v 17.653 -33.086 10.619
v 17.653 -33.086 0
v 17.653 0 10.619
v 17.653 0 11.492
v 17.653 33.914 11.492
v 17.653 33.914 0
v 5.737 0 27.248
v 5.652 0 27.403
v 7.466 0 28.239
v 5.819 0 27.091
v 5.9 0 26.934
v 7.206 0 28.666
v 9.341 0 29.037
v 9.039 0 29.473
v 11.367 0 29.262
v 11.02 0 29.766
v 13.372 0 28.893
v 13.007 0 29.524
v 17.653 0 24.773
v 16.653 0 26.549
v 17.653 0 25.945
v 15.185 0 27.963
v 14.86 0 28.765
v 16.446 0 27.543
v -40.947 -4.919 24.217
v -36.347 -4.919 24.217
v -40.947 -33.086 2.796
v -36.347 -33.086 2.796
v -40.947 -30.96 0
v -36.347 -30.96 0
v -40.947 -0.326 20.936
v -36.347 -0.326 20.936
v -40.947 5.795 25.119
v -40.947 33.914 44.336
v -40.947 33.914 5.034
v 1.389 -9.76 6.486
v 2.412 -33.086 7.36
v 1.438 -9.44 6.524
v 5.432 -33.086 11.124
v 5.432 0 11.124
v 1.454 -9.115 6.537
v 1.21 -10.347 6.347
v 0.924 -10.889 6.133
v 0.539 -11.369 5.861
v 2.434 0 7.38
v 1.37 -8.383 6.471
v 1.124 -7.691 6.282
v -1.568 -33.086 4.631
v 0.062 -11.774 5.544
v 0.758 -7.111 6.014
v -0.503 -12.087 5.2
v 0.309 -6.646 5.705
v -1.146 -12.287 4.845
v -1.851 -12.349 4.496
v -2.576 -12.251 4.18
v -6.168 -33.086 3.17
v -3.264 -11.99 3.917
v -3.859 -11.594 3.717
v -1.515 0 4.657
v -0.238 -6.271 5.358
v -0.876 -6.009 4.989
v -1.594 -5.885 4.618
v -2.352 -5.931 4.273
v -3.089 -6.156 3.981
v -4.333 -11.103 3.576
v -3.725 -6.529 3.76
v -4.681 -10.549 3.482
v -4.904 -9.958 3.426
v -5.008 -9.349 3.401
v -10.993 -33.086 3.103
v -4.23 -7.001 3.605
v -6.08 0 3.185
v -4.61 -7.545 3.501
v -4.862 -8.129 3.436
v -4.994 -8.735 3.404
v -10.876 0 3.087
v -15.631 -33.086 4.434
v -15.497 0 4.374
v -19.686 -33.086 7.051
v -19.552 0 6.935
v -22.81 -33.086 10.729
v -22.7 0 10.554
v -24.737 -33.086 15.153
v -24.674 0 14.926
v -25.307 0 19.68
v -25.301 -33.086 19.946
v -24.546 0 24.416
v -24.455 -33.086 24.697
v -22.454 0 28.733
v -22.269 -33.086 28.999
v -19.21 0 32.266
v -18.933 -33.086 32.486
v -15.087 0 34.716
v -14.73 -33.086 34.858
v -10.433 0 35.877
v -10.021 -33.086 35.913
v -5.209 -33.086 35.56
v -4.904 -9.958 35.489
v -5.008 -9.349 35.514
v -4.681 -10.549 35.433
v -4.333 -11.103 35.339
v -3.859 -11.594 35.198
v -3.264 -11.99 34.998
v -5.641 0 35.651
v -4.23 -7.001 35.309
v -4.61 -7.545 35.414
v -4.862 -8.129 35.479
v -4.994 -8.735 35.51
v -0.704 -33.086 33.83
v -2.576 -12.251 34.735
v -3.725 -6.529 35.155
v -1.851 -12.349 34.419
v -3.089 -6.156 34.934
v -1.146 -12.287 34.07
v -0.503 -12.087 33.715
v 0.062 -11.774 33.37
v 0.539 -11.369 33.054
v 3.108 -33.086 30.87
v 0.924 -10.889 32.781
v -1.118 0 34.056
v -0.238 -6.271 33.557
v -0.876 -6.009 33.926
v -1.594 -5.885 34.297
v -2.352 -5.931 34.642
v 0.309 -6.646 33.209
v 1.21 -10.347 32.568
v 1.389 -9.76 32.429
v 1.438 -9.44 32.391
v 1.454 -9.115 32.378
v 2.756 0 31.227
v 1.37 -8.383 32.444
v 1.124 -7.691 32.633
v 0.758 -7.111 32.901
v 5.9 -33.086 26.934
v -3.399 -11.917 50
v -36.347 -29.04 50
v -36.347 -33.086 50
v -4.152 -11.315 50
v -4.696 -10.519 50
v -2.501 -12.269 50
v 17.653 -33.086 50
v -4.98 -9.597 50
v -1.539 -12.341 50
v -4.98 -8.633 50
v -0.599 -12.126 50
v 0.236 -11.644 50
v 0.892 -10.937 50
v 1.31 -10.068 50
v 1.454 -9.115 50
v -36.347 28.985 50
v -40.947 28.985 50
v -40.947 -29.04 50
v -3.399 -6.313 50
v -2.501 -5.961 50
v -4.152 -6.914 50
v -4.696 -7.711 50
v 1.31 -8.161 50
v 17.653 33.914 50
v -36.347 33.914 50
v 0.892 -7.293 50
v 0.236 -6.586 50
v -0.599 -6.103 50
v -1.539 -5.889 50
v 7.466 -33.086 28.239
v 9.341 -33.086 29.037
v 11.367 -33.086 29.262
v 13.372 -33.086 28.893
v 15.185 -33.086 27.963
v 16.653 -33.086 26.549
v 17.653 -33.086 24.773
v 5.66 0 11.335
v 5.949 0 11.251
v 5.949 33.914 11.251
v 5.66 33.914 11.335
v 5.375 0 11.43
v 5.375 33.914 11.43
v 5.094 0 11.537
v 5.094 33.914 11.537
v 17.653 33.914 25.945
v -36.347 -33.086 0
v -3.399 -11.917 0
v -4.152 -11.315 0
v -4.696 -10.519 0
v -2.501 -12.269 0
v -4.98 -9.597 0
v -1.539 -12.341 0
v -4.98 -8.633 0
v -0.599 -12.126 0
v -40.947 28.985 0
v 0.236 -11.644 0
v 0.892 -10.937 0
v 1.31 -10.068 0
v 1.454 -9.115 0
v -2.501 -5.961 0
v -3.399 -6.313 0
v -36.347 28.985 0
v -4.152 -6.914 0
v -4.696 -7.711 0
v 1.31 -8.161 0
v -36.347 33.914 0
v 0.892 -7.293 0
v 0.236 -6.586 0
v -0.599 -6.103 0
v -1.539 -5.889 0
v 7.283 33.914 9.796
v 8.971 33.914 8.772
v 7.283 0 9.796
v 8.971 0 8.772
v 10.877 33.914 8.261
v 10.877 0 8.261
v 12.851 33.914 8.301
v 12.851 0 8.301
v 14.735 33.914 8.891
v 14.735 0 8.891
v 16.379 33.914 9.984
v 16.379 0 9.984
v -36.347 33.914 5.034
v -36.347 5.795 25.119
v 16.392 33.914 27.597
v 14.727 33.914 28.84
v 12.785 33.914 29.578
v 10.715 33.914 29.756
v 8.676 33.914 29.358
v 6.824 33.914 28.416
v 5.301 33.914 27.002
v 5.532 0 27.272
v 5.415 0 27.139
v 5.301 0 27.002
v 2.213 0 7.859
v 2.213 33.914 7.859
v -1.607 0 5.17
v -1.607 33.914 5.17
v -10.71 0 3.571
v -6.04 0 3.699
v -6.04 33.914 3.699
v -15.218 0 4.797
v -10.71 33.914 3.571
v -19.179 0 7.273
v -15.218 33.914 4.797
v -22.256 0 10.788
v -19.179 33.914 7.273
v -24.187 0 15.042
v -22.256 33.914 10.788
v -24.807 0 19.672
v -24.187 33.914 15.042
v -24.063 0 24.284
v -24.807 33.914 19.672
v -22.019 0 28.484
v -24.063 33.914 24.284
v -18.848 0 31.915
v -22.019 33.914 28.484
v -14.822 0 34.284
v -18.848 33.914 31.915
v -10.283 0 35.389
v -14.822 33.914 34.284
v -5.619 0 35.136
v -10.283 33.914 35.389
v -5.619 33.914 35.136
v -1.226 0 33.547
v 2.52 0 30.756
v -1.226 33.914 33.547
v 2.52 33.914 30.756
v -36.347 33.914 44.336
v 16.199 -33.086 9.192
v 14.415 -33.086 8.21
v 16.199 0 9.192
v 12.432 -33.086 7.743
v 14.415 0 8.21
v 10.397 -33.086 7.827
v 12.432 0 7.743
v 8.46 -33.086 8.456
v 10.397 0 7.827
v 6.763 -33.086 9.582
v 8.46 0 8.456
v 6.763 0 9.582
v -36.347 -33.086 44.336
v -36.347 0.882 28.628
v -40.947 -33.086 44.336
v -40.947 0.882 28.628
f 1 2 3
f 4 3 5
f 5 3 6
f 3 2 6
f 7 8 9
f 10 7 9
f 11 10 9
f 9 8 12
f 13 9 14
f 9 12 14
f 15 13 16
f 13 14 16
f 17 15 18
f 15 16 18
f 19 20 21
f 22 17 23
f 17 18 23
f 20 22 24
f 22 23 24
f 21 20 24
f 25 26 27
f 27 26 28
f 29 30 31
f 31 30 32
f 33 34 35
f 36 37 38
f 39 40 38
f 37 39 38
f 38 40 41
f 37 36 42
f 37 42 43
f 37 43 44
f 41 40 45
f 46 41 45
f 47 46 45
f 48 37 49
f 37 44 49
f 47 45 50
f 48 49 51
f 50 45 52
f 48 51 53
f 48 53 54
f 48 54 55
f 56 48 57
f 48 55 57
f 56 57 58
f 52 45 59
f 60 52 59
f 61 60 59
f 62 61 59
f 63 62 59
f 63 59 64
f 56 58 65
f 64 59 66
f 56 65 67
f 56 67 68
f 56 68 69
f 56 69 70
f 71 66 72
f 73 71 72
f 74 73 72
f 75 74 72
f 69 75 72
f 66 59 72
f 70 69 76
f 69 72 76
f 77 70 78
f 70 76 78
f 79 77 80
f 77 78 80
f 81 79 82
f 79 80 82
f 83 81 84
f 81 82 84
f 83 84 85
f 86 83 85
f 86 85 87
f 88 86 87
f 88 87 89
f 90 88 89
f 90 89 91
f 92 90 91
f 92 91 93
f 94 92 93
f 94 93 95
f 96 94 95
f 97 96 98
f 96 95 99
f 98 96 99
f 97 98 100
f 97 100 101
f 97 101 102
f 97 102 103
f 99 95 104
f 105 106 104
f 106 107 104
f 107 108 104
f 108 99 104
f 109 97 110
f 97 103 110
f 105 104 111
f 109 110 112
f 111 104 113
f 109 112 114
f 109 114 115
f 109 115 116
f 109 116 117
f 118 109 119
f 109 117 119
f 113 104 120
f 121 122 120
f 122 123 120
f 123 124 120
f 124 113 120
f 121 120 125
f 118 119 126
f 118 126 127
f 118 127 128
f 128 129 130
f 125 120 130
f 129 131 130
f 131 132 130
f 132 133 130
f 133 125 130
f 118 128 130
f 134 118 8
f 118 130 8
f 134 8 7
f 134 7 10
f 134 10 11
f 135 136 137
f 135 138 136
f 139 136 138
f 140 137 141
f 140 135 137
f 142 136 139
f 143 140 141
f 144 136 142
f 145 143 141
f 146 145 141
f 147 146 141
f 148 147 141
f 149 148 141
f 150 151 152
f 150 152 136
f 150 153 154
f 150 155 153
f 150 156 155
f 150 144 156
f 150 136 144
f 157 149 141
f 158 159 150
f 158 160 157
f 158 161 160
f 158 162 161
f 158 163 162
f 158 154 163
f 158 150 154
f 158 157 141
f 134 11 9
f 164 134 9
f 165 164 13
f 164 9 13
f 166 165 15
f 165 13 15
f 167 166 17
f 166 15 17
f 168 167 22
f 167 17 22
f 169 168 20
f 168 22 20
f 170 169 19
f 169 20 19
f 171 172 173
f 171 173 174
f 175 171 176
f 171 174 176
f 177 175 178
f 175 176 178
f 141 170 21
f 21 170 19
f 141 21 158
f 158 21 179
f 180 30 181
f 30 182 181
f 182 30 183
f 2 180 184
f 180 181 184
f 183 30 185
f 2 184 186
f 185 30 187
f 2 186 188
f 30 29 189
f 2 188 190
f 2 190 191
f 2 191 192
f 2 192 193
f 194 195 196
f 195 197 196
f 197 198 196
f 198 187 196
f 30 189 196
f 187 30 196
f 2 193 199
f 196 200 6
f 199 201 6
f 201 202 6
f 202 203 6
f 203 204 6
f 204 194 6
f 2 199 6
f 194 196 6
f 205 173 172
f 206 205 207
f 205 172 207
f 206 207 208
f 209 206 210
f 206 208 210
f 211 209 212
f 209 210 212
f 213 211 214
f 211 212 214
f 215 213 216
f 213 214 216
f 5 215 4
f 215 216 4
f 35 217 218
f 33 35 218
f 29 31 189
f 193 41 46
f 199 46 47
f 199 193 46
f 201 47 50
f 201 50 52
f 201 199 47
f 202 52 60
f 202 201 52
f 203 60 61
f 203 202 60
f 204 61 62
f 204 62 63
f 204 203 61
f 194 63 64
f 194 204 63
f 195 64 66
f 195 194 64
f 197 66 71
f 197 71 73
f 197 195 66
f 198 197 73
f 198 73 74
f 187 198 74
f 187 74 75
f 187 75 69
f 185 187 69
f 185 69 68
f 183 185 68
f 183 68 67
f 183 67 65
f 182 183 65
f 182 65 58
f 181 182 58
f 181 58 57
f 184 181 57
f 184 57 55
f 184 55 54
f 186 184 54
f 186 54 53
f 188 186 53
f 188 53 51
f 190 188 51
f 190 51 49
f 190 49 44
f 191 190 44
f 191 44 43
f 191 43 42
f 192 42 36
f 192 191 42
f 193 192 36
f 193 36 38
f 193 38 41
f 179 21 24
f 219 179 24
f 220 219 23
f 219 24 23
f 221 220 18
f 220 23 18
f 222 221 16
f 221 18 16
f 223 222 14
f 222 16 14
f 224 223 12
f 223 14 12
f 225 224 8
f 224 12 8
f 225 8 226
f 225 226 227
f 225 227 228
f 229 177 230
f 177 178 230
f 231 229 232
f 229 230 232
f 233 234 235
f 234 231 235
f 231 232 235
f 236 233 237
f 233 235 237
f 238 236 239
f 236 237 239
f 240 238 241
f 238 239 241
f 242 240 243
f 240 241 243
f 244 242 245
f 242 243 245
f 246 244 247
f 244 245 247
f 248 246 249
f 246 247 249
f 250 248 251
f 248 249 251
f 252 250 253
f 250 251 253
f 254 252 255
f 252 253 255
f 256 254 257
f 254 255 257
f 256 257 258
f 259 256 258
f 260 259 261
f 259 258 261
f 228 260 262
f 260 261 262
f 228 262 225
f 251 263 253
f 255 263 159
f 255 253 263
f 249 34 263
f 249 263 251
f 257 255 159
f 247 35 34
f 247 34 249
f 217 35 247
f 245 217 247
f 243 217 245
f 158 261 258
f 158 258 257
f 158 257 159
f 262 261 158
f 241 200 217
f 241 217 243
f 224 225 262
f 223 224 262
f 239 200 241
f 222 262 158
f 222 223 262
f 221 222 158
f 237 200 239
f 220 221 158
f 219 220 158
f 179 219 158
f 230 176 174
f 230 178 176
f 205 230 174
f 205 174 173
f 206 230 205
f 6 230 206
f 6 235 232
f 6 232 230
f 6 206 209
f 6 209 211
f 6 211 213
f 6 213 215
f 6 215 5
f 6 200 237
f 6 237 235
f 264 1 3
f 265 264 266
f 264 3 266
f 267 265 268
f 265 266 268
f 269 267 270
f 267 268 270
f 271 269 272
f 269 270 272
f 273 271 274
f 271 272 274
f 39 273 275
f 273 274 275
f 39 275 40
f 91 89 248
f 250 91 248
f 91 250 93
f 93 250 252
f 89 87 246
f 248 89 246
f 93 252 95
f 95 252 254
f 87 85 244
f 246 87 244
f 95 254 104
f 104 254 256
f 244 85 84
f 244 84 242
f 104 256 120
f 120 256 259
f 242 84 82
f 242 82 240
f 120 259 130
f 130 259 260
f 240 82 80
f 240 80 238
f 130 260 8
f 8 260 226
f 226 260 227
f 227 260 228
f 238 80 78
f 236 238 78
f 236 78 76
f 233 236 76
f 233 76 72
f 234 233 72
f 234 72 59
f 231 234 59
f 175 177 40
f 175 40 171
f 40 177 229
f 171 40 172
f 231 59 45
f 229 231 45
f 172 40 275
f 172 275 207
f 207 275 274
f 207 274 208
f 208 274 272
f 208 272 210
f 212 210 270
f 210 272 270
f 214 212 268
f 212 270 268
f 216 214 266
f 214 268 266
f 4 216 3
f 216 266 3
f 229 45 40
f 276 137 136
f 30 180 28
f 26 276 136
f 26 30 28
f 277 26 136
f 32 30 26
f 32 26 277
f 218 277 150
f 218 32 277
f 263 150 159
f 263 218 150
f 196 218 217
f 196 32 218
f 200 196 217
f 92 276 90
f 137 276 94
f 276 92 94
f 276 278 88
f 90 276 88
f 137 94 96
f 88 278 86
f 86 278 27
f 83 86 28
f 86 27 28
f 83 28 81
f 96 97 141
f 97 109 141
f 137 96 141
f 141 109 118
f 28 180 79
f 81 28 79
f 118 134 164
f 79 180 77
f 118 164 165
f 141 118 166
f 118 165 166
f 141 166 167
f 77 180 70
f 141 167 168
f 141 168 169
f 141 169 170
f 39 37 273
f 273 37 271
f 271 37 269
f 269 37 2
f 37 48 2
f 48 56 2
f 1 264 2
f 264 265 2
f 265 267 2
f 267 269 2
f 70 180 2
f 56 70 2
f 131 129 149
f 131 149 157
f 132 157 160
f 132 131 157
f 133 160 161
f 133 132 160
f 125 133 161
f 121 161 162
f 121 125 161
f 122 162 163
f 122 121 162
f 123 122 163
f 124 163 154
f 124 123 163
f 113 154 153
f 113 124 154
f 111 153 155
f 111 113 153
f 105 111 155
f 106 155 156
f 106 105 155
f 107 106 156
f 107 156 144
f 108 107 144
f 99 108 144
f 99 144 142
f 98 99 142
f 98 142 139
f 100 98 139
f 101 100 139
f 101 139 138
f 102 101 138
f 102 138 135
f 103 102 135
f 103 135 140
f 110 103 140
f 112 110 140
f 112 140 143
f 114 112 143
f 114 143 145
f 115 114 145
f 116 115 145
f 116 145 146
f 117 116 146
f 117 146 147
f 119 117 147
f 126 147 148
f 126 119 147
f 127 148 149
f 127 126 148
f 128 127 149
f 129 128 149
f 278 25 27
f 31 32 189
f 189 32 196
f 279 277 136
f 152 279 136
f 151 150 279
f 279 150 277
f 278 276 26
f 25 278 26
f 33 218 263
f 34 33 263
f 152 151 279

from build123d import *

# Parameters (mm, degrees)
F0_W      = 54
F0_H      = 67
F0_R      = 3.2350840479
F1_DEPTH  = 50
F3_D      = 33
F3_DEPTH  = 33.0871826465
F4_D      = 32
F5_D      = 14
F5_DEPTH  = 33.0871827465
F6_D      = 14
F6_DEPTH  = 33.9148173535
F7_D      = 14
F7_DEPTH  = 33.0871827465
F8_D      = 15
F8_DEPTH  = 33.0871827465
F9_D      = 15
F10_D     = 15
F10_DEPTH = 33.9148173535
F12_DEPTH = 4.6


with BuildPart() as f1:
    # F0 (on Top) → F1 (new body)
    with BuildSketch(Plane.XY):
        with Locations((-9.3474117796, 0.4138173535)):
            Rectangle(F0_W, F0_H)
        with Locations((-1.7809633864, -9.1149061918)):
            Circle(F0_R, mode=Mode.SUBTRACT)
    extrude(amount=F1_DEPTH)

    # F3 (through all, one way)
    with BuildSketch(Plane(origin=(0, 0, 0), x_dir=(1, 0, 0), z_dir=(0, 1, 0))):
        with Locations((-8.8084321469, -19.4574296474)):
            Circle(F3_D / 2)
    extrude(amount=-F3_DEPTH, mode=Mode.SUBTRACT)

    # F4 (through all)
    with Locations(Plane.XZ):
        with Locations((-8.8084321469, 19.4574296474)):
            Hole(F4_D / 2)

    # F5 (through all, one way)
    with BuildSketch(Plane(origin=(0, 0, 0), x_dir=(1, 0, 0), z_dir=(0, 1, 0))):
        with Locations((11.1167700961, -22.2662836313)):
            Circle(F5_D / 2)
    extrude(amount=-F5_DEPTH, mode=Mode.SUBTRACT)

    # F6 (through all, one way)
    with BuildSketch(Plane.XZ):
        with Locations((11.7215663195, 15.209428966)):
            Circle(F6_D / 2)
    extrude(amount=-F6_DEPTH, mode=Mode.SUBTRACT)

    # F7 (through all, one way)
    with BuildSketch(Plane(origin=(0, 0, 0), x_dir=(1, 0, 0), z_dir=(0, 1, 0))):
        with Locations((7.8991507475, -18.4924459839)):
            Circle(F7_D / 2)
    extrude(amount=-F7_DEPTH, mode=Mode.SUBTRACT)

    # F8 (through all, one way)
    with BuildSketch(Plane(origin=(0, 0, 0), x_dir=(1, 0, 0), z_dir=(0, 1, 0))):
        with Locations((11.7215663195, -15.209428966)):
            Circle(F8_D / 2)
    extrude(amount=-F8_DEPTH, mode=Mode.SUBTRACT)

    # F9 (through all)
    with Locations(Plane.XZ):
        with Locations((7.8991507475, 18.4924459839)):
            Hole(F9_D / 2)

    # F10 (through all, one way)
    with BuildSketch(Plane.XZ):
        with Locations((11.1167700961, 22.2662836313)):
            Circle(F10_D / 2)
    extrude(amount=-F10_DEPTH, mode=Mode.SUBTRACT)

    # F11 (on face) → F12 (join)
    with BuildSketch(Plane(origin=(-36.3474117796, 0, 0), x_dir=(0, -1, 0), z_dir=(-1, 0, 0))):
        Polygon((-28.9854729855, 50), (-0.8816519102, 28.6277458975), (29.0403384715, 50), align=None)
        Polygon((-33.9138173535, 44.3356601551), (-33.9138173535, 5.0340001471), (-5.7946280701, 25.1185750987), align=None)
        Polygon((33.0861826465, 44.3356601551), (4.9187896518, 24.2166549416), (33.0861826465, 2.7960559819), align=None)
        Polygon((0.3256148099, 20.935907284), (-28.9854729855, 0), (30.959851897, 0), align=None)
    extrude(amount=F12_DEPTH)


solid = f1.part
